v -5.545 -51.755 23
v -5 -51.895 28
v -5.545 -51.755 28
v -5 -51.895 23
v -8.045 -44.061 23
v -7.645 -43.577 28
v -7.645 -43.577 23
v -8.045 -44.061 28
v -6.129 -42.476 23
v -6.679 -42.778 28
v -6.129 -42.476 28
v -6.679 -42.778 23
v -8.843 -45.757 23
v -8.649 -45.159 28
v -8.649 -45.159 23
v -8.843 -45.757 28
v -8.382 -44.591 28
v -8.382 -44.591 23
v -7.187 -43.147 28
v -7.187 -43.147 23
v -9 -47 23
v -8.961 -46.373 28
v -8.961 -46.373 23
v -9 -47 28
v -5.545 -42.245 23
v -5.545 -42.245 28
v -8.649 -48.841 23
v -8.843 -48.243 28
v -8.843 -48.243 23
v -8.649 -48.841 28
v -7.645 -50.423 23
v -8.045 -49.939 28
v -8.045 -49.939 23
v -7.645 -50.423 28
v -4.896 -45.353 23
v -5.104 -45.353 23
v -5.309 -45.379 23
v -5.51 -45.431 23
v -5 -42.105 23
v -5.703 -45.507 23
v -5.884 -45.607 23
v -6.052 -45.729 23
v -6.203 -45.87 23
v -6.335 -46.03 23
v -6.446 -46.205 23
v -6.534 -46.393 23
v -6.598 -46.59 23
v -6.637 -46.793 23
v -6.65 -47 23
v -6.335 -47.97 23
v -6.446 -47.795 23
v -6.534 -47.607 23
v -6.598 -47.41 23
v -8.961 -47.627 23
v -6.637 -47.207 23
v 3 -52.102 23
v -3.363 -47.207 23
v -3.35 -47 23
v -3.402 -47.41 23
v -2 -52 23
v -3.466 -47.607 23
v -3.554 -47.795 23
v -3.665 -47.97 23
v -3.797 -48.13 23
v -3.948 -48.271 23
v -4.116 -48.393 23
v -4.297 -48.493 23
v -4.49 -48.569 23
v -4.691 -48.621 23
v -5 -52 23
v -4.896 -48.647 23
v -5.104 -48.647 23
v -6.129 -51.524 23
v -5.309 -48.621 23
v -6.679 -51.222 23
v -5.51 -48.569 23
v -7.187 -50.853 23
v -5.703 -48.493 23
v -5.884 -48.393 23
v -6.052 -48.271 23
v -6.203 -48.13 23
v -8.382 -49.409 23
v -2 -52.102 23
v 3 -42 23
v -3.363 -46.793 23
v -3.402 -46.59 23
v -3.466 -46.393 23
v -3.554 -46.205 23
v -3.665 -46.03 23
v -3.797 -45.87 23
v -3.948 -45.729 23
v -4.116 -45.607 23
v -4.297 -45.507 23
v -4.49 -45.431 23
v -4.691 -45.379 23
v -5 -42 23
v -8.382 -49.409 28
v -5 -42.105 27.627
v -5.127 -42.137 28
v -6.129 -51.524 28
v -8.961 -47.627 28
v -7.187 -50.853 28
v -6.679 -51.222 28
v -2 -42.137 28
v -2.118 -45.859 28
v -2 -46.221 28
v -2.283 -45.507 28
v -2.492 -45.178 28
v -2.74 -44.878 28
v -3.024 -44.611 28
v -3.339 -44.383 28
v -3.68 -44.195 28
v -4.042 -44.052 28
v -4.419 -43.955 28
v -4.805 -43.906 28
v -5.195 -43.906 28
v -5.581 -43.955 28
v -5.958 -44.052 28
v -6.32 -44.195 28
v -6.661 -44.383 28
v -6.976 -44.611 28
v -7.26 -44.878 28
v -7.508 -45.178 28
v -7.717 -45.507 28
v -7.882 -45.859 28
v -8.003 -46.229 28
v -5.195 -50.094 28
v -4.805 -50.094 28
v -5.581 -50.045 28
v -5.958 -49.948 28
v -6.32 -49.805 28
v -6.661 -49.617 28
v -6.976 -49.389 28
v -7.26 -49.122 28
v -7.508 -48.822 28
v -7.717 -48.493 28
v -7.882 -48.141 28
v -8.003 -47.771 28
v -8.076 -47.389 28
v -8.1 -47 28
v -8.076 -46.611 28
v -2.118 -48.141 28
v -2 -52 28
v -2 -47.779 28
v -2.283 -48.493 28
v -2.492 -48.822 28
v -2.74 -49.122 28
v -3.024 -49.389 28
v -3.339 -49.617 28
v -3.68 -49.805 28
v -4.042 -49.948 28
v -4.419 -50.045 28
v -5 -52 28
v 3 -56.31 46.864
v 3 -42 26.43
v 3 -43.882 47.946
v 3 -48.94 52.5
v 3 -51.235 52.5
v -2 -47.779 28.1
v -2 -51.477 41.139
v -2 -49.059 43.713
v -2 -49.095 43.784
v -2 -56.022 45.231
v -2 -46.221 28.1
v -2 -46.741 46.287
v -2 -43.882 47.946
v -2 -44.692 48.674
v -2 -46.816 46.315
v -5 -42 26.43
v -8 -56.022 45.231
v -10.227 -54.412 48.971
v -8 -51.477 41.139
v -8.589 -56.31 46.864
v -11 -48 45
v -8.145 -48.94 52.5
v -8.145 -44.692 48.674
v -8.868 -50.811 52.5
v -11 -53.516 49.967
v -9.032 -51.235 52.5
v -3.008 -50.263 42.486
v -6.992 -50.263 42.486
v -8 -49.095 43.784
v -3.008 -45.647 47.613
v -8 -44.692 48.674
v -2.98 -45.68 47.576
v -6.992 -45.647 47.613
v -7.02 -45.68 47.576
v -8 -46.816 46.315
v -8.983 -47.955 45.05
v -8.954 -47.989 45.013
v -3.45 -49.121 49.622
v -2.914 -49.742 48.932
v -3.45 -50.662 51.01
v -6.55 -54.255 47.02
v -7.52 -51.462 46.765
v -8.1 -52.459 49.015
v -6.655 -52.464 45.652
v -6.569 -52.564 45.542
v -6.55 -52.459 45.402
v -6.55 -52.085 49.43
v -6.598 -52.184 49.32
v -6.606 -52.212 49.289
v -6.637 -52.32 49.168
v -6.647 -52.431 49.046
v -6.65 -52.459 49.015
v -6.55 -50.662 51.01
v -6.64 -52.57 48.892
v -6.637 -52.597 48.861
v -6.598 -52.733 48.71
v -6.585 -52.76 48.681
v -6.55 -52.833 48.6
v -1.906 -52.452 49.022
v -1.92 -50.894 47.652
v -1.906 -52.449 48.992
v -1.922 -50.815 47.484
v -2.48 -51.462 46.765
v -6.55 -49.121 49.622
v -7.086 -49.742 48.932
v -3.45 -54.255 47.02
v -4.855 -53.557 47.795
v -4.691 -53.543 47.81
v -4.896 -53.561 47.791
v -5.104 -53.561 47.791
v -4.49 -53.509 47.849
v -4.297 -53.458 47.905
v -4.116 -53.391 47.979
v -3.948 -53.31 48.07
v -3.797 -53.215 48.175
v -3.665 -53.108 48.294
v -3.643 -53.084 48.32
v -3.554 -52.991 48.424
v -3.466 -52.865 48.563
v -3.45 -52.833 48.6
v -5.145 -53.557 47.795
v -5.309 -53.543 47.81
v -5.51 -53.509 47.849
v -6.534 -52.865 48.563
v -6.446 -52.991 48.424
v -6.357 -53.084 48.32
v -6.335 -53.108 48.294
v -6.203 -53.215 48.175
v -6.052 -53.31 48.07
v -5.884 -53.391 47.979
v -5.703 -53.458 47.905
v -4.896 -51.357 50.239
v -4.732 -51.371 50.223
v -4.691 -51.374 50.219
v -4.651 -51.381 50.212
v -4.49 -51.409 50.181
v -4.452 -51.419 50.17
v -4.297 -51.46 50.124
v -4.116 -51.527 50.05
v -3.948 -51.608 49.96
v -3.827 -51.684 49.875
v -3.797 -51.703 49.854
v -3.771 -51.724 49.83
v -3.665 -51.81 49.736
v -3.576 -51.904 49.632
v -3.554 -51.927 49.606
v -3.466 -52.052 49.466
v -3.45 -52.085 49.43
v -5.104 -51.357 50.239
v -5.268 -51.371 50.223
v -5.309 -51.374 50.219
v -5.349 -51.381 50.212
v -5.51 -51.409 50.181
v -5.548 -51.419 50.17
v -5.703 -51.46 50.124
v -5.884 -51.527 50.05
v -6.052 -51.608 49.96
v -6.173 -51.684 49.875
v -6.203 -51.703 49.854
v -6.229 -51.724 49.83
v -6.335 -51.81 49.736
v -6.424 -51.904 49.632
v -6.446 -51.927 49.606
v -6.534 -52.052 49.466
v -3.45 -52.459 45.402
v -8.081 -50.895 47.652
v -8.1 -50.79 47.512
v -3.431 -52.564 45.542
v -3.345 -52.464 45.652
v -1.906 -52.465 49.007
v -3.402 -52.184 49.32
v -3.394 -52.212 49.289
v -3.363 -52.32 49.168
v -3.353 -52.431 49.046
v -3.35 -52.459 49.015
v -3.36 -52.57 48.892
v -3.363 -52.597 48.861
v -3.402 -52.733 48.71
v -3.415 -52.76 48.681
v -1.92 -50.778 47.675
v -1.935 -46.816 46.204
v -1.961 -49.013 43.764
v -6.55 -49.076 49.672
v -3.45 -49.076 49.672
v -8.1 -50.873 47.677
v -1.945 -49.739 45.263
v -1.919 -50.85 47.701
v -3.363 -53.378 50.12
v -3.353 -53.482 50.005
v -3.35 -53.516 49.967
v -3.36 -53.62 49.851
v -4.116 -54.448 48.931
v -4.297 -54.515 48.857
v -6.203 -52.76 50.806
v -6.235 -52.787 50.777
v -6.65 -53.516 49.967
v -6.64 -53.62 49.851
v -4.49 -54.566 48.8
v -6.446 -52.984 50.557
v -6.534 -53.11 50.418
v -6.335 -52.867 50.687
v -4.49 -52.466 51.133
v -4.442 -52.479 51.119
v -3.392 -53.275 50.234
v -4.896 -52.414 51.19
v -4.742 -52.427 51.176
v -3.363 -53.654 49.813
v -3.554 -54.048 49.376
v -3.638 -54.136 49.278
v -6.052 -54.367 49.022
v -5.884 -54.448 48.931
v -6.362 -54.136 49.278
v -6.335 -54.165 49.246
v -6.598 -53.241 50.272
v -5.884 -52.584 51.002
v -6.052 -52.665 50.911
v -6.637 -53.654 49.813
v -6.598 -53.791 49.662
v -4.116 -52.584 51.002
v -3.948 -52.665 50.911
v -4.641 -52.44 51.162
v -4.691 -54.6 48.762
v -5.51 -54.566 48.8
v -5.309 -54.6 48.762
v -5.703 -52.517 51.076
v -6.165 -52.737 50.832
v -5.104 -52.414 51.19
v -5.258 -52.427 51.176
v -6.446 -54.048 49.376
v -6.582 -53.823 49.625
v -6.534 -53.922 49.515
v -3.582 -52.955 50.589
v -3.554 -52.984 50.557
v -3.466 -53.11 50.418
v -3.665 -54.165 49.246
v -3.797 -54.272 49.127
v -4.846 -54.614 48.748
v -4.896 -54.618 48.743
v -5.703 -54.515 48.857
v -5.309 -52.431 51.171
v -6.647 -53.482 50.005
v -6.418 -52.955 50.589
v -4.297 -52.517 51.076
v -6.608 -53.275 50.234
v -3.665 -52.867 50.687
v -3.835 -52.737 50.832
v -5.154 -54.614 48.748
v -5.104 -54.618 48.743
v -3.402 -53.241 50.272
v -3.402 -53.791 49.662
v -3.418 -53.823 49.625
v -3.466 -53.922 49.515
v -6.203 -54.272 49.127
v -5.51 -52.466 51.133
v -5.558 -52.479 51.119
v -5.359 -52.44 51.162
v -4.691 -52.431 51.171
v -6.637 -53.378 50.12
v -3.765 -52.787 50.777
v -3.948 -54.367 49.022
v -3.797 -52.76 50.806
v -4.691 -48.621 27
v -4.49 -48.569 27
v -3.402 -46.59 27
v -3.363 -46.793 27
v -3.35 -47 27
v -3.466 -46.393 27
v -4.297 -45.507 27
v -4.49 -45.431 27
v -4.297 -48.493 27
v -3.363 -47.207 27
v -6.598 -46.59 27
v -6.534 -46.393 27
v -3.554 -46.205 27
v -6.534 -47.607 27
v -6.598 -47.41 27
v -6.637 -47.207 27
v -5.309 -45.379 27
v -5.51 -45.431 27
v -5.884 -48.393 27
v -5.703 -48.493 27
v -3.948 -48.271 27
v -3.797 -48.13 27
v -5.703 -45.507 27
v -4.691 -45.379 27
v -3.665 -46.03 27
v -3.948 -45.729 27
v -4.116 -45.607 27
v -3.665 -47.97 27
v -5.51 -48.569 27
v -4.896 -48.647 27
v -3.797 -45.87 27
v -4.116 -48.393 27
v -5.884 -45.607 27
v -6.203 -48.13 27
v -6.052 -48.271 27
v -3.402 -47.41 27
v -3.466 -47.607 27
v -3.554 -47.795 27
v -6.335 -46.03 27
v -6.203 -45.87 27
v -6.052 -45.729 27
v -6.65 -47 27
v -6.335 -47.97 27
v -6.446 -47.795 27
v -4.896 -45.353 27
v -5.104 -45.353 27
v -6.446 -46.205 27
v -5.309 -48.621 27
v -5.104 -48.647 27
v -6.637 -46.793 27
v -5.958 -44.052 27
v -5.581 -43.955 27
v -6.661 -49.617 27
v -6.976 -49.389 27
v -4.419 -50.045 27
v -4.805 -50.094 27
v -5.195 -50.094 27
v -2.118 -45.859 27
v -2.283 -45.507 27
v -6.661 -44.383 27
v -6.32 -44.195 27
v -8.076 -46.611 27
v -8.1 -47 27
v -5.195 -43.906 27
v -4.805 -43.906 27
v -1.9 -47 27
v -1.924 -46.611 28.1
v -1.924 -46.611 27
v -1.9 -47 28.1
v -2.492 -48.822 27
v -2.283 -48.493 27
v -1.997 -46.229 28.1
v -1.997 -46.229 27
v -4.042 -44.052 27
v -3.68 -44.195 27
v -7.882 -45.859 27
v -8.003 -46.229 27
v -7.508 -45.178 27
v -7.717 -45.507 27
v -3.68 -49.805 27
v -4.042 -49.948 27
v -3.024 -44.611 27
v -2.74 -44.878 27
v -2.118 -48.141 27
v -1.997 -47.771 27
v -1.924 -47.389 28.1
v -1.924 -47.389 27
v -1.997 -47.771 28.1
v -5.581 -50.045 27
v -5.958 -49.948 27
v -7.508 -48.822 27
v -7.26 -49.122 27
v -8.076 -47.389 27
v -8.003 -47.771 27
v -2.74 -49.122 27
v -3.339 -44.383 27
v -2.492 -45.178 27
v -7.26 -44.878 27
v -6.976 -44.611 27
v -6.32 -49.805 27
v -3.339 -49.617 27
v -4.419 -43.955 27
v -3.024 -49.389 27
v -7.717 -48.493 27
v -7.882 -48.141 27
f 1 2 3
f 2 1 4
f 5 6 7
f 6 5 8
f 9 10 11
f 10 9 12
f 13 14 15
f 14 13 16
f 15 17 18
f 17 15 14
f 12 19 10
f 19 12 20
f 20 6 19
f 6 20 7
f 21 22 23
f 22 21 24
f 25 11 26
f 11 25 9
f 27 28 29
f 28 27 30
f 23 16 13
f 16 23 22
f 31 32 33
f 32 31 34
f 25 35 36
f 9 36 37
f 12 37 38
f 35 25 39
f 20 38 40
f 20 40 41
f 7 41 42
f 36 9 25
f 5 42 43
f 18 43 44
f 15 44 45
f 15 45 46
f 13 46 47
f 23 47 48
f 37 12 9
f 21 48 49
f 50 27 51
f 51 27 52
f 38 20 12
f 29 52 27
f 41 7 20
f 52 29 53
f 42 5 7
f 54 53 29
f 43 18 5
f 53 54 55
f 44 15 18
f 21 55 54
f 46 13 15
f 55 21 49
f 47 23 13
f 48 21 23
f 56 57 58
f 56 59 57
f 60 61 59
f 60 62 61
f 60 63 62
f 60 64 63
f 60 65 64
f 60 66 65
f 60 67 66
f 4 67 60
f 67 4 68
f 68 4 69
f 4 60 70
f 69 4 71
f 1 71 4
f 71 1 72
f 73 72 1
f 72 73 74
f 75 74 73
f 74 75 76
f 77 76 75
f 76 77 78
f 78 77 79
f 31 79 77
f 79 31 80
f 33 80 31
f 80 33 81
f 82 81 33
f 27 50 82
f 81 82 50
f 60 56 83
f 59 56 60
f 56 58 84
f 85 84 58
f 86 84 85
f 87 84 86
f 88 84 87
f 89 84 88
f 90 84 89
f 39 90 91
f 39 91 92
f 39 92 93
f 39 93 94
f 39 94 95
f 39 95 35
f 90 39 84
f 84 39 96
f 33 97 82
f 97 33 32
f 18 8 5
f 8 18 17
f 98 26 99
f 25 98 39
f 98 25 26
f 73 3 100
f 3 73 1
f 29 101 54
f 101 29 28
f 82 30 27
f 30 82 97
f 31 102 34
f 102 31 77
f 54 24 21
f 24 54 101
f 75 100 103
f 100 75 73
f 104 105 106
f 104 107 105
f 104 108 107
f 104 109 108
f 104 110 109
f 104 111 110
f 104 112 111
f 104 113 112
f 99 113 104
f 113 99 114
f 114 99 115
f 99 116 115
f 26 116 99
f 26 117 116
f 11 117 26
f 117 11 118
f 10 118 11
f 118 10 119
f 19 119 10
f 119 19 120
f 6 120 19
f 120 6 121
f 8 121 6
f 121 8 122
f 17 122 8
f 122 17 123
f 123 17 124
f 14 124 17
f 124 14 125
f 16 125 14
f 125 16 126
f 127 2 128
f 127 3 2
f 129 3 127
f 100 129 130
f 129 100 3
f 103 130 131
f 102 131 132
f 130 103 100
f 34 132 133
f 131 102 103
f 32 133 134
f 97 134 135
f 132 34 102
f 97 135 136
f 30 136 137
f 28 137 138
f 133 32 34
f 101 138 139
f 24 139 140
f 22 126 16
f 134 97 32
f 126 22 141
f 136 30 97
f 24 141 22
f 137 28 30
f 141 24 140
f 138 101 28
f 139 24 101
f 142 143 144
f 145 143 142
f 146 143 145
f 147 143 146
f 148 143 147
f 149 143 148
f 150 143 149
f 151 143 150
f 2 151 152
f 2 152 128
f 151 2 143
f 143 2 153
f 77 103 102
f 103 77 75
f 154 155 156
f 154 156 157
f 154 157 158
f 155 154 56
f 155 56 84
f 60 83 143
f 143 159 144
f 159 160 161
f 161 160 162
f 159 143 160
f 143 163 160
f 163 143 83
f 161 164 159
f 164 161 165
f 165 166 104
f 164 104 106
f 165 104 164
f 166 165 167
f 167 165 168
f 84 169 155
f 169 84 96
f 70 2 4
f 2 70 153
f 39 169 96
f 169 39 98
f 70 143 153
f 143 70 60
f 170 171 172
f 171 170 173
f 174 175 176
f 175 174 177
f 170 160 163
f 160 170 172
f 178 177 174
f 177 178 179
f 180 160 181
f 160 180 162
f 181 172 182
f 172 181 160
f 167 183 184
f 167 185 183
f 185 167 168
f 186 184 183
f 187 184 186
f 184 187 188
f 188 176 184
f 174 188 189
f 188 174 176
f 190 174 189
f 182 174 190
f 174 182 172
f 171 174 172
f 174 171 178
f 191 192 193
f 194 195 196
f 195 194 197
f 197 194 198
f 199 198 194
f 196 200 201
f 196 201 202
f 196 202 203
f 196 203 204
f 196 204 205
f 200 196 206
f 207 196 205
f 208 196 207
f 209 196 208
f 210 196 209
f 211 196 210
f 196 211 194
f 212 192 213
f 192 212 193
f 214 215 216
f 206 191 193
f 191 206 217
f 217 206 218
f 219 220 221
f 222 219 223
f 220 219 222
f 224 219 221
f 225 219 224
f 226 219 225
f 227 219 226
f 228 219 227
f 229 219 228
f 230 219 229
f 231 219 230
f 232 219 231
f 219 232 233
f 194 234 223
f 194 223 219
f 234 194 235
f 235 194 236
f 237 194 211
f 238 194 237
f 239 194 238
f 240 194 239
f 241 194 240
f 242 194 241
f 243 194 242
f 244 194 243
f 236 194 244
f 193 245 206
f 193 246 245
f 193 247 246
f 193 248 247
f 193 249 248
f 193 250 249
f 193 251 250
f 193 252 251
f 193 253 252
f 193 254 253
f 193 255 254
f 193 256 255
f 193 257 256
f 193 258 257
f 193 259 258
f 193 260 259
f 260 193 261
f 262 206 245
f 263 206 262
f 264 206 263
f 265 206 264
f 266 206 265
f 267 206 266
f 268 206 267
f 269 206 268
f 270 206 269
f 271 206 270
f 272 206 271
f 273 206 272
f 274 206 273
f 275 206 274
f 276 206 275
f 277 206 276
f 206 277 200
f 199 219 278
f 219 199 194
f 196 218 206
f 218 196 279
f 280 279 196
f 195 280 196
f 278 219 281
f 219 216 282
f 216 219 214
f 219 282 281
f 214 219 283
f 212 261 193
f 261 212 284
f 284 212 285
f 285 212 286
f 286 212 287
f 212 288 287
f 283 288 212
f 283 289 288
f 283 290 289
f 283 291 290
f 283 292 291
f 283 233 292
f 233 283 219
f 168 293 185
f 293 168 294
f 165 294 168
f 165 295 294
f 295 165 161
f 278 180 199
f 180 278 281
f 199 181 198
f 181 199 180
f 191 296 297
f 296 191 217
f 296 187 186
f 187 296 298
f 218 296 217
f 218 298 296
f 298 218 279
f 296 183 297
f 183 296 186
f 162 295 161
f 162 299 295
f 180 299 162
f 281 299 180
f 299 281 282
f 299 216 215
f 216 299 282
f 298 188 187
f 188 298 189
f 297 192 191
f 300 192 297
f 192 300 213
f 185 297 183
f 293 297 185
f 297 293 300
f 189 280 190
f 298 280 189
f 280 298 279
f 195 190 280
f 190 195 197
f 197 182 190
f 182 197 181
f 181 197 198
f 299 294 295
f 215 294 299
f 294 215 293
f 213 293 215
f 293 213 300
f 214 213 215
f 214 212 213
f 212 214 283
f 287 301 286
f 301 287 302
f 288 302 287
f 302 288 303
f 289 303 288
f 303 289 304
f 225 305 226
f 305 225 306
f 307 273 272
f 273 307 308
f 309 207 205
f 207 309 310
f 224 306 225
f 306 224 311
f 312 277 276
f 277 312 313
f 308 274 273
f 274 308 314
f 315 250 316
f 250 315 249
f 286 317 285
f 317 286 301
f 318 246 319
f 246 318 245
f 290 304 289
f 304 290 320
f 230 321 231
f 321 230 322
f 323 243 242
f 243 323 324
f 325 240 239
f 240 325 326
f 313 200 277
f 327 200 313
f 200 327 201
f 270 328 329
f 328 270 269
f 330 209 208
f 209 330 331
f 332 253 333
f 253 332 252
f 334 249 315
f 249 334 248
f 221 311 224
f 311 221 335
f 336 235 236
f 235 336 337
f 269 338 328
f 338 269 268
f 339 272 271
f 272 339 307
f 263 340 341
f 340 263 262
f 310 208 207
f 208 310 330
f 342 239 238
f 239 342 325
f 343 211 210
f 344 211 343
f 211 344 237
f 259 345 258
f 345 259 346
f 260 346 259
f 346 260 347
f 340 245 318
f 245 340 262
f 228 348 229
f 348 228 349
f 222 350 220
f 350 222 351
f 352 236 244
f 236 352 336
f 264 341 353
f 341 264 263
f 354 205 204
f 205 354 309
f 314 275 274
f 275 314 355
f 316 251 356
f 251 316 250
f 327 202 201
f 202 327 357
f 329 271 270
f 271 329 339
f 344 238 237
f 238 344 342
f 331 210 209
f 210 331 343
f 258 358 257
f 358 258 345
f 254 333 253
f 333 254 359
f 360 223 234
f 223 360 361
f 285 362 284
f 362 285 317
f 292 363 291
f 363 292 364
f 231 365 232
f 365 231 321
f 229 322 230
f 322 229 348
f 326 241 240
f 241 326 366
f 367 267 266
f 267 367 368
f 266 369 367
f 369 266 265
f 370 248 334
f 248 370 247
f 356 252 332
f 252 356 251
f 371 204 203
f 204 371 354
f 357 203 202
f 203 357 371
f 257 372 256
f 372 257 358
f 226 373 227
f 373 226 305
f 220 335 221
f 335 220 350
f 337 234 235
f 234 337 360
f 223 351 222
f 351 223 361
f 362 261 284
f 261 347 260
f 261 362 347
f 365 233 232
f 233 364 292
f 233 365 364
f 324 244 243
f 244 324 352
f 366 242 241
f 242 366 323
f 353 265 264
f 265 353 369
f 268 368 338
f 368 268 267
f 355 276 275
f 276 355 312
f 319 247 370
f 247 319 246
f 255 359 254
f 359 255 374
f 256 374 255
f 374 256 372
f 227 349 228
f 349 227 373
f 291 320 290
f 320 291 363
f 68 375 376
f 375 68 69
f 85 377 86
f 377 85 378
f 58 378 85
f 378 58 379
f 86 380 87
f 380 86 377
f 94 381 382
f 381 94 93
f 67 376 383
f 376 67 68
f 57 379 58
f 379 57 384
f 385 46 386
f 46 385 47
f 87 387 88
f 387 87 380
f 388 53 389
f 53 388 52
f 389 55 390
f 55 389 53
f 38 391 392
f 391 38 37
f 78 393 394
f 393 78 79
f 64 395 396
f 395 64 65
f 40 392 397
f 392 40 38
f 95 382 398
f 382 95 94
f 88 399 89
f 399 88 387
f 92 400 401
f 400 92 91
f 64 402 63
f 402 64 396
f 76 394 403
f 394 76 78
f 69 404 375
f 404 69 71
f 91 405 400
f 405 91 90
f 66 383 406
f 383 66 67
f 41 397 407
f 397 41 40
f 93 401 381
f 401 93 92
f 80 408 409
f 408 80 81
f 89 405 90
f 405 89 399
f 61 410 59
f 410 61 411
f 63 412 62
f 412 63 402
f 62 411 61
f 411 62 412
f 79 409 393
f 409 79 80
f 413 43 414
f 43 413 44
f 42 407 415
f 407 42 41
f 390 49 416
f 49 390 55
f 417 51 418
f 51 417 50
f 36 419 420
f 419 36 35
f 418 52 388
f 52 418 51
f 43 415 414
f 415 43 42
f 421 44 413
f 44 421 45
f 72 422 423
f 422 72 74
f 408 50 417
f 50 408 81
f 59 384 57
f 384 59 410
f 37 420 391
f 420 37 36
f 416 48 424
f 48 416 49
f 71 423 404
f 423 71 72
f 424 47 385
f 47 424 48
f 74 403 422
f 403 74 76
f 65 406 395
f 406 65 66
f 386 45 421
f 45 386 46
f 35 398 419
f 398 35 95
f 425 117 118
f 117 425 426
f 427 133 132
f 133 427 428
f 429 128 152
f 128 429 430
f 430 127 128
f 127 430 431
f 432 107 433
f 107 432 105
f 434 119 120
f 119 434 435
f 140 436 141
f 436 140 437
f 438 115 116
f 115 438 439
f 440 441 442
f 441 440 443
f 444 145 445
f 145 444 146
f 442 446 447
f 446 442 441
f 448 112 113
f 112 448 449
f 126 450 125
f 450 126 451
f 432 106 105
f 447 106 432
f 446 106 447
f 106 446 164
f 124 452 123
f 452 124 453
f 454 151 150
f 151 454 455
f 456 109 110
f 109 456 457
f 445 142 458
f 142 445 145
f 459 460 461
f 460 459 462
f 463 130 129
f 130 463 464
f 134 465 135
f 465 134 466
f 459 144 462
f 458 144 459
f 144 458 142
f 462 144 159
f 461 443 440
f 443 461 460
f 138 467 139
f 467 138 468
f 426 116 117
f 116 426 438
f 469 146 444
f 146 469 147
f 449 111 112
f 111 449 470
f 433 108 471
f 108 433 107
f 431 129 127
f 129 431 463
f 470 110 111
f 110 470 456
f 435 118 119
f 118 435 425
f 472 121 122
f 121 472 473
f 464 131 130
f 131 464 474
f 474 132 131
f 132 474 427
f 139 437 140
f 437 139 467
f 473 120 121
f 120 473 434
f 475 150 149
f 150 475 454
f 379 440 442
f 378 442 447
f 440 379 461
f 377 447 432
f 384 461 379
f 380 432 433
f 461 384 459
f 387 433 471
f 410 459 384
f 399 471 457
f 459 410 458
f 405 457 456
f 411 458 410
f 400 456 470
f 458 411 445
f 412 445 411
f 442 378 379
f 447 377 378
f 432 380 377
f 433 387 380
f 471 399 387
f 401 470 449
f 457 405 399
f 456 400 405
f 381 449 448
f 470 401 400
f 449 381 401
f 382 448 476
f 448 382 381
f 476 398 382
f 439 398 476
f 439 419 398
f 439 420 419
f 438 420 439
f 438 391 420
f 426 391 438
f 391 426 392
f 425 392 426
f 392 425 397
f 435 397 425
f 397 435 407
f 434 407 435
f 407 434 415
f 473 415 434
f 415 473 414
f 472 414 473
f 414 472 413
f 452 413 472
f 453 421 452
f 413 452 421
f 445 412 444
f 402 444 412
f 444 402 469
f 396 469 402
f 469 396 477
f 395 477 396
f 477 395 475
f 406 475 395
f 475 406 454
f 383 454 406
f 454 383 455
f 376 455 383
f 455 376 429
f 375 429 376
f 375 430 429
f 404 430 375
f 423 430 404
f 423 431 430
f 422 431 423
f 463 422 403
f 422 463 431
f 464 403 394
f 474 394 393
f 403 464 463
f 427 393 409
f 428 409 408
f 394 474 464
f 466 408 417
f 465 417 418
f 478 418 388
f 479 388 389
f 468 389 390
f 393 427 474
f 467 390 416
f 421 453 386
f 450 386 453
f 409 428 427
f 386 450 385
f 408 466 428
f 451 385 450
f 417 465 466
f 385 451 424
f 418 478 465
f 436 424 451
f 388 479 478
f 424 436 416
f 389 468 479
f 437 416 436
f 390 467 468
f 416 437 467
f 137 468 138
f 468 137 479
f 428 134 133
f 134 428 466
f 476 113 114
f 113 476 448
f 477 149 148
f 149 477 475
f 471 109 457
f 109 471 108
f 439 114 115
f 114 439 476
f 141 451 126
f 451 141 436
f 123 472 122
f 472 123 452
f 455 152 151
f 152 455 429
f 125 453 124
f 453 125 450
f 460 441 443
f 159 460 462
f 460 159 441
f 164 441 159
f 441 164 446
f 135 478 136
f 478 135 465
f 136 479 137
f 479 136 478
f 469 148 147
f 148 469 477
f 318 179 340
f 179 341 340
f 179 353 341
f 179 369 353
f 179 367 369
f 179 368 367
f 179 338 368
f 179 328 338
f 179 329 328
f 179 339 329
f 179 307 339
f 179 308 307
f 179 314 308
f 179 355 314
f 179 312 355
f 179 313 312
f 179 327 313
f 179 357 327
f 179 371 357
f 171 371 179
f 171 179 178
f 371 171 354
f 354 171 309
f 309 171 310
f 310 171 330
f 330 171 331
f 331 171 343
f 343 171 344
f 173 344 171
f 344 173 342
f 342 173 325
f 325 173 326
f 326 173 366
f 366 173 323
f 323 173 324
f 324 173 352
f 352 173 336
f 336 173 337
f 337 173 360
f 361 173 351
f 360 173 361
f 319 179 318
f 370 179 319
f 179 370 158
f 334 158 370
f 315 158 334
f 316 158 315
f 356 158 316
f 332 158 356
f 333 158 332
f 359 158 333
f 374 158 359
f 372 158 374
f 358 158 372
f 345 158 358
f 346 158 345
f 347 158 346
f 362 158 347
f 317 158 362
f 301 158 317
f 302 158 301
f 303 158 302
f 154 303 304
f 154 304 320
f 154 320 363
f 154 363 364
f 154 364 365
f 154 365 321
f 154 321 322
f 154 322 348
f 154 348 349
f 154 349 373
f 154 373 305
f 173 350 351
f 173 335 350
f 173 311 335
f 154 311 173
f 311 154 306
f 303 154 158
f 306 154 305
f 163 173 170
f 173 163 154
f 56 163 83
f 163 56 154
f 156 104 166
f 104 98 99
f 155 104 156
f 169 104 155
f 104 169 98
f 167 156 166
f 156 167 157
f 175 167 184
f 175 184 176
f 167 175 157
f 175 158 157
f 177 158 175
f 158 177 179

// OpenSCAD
// PRUSA iteration4
// Print fan support
// GNU GPL v3
// Josef Průša <iam@josefprusa.cz> and contributors
// http://www.reprap.org/wiki/Prusa_Mendel
// http://prusamendel.org



difference()
{
    union()
{
        translate([-4,-47,23]) rotate([0,0,0])cylinder(h = 5, r=5, $fn=50);
        translate([-2,-57,23]) rotate([0,0,0]) cube([5,15,30]);
        translate([-5,-52,23]) rotate([0,0,0]) cube([8,10,5]);
        translate([-5,-48,45]) rotate([48,0,0])cylinder(h = 10, r=6, $fn=6);
}

        translate([-5,-48,45]) rotate([48,0,0])cylinder(h = 30, r=1.65, $fn=50);
        
        
        difference()
        {
            union()
            {
                translate([-5,-48,45]) rotate([48,0,0])cylinder(h = 6, r=3.1, $fn=6);
                translate([-5,-47.9,45]) rotate([48,0,0])cylinder(h = 4, r2=3.1,r1=4, $fn=6);
            }
            translate([-2,-55,40]) rotate([0,0.6,0]) cube([10,10,10]);
        }
        translate([-5,-47,10]) rotate([0,0,0])cylinder(h = 25, r=1.65, $fn=50);
        translate([-5,-47,27]) rotate([0,0,0])cylinder(h = 1.1, r=3.1, $fn=50);
        
        translate([10,-85,15]) rotate([0,-48,90]) cube([60,50,20]);
        translate([-15,-71,15]) rotate([10,0,0]) cube([50,20,40]);
        translate([-15,-41,15]) rotate([5,0,0]) cube([50,20,40]);
        translate([-15,-39.5,44]) rotate([48,0,0]) cube([20,20,20]);
        translate([-15,-60,52.5]) rotate([0,0,0]) cube([20,20,20]);
}
